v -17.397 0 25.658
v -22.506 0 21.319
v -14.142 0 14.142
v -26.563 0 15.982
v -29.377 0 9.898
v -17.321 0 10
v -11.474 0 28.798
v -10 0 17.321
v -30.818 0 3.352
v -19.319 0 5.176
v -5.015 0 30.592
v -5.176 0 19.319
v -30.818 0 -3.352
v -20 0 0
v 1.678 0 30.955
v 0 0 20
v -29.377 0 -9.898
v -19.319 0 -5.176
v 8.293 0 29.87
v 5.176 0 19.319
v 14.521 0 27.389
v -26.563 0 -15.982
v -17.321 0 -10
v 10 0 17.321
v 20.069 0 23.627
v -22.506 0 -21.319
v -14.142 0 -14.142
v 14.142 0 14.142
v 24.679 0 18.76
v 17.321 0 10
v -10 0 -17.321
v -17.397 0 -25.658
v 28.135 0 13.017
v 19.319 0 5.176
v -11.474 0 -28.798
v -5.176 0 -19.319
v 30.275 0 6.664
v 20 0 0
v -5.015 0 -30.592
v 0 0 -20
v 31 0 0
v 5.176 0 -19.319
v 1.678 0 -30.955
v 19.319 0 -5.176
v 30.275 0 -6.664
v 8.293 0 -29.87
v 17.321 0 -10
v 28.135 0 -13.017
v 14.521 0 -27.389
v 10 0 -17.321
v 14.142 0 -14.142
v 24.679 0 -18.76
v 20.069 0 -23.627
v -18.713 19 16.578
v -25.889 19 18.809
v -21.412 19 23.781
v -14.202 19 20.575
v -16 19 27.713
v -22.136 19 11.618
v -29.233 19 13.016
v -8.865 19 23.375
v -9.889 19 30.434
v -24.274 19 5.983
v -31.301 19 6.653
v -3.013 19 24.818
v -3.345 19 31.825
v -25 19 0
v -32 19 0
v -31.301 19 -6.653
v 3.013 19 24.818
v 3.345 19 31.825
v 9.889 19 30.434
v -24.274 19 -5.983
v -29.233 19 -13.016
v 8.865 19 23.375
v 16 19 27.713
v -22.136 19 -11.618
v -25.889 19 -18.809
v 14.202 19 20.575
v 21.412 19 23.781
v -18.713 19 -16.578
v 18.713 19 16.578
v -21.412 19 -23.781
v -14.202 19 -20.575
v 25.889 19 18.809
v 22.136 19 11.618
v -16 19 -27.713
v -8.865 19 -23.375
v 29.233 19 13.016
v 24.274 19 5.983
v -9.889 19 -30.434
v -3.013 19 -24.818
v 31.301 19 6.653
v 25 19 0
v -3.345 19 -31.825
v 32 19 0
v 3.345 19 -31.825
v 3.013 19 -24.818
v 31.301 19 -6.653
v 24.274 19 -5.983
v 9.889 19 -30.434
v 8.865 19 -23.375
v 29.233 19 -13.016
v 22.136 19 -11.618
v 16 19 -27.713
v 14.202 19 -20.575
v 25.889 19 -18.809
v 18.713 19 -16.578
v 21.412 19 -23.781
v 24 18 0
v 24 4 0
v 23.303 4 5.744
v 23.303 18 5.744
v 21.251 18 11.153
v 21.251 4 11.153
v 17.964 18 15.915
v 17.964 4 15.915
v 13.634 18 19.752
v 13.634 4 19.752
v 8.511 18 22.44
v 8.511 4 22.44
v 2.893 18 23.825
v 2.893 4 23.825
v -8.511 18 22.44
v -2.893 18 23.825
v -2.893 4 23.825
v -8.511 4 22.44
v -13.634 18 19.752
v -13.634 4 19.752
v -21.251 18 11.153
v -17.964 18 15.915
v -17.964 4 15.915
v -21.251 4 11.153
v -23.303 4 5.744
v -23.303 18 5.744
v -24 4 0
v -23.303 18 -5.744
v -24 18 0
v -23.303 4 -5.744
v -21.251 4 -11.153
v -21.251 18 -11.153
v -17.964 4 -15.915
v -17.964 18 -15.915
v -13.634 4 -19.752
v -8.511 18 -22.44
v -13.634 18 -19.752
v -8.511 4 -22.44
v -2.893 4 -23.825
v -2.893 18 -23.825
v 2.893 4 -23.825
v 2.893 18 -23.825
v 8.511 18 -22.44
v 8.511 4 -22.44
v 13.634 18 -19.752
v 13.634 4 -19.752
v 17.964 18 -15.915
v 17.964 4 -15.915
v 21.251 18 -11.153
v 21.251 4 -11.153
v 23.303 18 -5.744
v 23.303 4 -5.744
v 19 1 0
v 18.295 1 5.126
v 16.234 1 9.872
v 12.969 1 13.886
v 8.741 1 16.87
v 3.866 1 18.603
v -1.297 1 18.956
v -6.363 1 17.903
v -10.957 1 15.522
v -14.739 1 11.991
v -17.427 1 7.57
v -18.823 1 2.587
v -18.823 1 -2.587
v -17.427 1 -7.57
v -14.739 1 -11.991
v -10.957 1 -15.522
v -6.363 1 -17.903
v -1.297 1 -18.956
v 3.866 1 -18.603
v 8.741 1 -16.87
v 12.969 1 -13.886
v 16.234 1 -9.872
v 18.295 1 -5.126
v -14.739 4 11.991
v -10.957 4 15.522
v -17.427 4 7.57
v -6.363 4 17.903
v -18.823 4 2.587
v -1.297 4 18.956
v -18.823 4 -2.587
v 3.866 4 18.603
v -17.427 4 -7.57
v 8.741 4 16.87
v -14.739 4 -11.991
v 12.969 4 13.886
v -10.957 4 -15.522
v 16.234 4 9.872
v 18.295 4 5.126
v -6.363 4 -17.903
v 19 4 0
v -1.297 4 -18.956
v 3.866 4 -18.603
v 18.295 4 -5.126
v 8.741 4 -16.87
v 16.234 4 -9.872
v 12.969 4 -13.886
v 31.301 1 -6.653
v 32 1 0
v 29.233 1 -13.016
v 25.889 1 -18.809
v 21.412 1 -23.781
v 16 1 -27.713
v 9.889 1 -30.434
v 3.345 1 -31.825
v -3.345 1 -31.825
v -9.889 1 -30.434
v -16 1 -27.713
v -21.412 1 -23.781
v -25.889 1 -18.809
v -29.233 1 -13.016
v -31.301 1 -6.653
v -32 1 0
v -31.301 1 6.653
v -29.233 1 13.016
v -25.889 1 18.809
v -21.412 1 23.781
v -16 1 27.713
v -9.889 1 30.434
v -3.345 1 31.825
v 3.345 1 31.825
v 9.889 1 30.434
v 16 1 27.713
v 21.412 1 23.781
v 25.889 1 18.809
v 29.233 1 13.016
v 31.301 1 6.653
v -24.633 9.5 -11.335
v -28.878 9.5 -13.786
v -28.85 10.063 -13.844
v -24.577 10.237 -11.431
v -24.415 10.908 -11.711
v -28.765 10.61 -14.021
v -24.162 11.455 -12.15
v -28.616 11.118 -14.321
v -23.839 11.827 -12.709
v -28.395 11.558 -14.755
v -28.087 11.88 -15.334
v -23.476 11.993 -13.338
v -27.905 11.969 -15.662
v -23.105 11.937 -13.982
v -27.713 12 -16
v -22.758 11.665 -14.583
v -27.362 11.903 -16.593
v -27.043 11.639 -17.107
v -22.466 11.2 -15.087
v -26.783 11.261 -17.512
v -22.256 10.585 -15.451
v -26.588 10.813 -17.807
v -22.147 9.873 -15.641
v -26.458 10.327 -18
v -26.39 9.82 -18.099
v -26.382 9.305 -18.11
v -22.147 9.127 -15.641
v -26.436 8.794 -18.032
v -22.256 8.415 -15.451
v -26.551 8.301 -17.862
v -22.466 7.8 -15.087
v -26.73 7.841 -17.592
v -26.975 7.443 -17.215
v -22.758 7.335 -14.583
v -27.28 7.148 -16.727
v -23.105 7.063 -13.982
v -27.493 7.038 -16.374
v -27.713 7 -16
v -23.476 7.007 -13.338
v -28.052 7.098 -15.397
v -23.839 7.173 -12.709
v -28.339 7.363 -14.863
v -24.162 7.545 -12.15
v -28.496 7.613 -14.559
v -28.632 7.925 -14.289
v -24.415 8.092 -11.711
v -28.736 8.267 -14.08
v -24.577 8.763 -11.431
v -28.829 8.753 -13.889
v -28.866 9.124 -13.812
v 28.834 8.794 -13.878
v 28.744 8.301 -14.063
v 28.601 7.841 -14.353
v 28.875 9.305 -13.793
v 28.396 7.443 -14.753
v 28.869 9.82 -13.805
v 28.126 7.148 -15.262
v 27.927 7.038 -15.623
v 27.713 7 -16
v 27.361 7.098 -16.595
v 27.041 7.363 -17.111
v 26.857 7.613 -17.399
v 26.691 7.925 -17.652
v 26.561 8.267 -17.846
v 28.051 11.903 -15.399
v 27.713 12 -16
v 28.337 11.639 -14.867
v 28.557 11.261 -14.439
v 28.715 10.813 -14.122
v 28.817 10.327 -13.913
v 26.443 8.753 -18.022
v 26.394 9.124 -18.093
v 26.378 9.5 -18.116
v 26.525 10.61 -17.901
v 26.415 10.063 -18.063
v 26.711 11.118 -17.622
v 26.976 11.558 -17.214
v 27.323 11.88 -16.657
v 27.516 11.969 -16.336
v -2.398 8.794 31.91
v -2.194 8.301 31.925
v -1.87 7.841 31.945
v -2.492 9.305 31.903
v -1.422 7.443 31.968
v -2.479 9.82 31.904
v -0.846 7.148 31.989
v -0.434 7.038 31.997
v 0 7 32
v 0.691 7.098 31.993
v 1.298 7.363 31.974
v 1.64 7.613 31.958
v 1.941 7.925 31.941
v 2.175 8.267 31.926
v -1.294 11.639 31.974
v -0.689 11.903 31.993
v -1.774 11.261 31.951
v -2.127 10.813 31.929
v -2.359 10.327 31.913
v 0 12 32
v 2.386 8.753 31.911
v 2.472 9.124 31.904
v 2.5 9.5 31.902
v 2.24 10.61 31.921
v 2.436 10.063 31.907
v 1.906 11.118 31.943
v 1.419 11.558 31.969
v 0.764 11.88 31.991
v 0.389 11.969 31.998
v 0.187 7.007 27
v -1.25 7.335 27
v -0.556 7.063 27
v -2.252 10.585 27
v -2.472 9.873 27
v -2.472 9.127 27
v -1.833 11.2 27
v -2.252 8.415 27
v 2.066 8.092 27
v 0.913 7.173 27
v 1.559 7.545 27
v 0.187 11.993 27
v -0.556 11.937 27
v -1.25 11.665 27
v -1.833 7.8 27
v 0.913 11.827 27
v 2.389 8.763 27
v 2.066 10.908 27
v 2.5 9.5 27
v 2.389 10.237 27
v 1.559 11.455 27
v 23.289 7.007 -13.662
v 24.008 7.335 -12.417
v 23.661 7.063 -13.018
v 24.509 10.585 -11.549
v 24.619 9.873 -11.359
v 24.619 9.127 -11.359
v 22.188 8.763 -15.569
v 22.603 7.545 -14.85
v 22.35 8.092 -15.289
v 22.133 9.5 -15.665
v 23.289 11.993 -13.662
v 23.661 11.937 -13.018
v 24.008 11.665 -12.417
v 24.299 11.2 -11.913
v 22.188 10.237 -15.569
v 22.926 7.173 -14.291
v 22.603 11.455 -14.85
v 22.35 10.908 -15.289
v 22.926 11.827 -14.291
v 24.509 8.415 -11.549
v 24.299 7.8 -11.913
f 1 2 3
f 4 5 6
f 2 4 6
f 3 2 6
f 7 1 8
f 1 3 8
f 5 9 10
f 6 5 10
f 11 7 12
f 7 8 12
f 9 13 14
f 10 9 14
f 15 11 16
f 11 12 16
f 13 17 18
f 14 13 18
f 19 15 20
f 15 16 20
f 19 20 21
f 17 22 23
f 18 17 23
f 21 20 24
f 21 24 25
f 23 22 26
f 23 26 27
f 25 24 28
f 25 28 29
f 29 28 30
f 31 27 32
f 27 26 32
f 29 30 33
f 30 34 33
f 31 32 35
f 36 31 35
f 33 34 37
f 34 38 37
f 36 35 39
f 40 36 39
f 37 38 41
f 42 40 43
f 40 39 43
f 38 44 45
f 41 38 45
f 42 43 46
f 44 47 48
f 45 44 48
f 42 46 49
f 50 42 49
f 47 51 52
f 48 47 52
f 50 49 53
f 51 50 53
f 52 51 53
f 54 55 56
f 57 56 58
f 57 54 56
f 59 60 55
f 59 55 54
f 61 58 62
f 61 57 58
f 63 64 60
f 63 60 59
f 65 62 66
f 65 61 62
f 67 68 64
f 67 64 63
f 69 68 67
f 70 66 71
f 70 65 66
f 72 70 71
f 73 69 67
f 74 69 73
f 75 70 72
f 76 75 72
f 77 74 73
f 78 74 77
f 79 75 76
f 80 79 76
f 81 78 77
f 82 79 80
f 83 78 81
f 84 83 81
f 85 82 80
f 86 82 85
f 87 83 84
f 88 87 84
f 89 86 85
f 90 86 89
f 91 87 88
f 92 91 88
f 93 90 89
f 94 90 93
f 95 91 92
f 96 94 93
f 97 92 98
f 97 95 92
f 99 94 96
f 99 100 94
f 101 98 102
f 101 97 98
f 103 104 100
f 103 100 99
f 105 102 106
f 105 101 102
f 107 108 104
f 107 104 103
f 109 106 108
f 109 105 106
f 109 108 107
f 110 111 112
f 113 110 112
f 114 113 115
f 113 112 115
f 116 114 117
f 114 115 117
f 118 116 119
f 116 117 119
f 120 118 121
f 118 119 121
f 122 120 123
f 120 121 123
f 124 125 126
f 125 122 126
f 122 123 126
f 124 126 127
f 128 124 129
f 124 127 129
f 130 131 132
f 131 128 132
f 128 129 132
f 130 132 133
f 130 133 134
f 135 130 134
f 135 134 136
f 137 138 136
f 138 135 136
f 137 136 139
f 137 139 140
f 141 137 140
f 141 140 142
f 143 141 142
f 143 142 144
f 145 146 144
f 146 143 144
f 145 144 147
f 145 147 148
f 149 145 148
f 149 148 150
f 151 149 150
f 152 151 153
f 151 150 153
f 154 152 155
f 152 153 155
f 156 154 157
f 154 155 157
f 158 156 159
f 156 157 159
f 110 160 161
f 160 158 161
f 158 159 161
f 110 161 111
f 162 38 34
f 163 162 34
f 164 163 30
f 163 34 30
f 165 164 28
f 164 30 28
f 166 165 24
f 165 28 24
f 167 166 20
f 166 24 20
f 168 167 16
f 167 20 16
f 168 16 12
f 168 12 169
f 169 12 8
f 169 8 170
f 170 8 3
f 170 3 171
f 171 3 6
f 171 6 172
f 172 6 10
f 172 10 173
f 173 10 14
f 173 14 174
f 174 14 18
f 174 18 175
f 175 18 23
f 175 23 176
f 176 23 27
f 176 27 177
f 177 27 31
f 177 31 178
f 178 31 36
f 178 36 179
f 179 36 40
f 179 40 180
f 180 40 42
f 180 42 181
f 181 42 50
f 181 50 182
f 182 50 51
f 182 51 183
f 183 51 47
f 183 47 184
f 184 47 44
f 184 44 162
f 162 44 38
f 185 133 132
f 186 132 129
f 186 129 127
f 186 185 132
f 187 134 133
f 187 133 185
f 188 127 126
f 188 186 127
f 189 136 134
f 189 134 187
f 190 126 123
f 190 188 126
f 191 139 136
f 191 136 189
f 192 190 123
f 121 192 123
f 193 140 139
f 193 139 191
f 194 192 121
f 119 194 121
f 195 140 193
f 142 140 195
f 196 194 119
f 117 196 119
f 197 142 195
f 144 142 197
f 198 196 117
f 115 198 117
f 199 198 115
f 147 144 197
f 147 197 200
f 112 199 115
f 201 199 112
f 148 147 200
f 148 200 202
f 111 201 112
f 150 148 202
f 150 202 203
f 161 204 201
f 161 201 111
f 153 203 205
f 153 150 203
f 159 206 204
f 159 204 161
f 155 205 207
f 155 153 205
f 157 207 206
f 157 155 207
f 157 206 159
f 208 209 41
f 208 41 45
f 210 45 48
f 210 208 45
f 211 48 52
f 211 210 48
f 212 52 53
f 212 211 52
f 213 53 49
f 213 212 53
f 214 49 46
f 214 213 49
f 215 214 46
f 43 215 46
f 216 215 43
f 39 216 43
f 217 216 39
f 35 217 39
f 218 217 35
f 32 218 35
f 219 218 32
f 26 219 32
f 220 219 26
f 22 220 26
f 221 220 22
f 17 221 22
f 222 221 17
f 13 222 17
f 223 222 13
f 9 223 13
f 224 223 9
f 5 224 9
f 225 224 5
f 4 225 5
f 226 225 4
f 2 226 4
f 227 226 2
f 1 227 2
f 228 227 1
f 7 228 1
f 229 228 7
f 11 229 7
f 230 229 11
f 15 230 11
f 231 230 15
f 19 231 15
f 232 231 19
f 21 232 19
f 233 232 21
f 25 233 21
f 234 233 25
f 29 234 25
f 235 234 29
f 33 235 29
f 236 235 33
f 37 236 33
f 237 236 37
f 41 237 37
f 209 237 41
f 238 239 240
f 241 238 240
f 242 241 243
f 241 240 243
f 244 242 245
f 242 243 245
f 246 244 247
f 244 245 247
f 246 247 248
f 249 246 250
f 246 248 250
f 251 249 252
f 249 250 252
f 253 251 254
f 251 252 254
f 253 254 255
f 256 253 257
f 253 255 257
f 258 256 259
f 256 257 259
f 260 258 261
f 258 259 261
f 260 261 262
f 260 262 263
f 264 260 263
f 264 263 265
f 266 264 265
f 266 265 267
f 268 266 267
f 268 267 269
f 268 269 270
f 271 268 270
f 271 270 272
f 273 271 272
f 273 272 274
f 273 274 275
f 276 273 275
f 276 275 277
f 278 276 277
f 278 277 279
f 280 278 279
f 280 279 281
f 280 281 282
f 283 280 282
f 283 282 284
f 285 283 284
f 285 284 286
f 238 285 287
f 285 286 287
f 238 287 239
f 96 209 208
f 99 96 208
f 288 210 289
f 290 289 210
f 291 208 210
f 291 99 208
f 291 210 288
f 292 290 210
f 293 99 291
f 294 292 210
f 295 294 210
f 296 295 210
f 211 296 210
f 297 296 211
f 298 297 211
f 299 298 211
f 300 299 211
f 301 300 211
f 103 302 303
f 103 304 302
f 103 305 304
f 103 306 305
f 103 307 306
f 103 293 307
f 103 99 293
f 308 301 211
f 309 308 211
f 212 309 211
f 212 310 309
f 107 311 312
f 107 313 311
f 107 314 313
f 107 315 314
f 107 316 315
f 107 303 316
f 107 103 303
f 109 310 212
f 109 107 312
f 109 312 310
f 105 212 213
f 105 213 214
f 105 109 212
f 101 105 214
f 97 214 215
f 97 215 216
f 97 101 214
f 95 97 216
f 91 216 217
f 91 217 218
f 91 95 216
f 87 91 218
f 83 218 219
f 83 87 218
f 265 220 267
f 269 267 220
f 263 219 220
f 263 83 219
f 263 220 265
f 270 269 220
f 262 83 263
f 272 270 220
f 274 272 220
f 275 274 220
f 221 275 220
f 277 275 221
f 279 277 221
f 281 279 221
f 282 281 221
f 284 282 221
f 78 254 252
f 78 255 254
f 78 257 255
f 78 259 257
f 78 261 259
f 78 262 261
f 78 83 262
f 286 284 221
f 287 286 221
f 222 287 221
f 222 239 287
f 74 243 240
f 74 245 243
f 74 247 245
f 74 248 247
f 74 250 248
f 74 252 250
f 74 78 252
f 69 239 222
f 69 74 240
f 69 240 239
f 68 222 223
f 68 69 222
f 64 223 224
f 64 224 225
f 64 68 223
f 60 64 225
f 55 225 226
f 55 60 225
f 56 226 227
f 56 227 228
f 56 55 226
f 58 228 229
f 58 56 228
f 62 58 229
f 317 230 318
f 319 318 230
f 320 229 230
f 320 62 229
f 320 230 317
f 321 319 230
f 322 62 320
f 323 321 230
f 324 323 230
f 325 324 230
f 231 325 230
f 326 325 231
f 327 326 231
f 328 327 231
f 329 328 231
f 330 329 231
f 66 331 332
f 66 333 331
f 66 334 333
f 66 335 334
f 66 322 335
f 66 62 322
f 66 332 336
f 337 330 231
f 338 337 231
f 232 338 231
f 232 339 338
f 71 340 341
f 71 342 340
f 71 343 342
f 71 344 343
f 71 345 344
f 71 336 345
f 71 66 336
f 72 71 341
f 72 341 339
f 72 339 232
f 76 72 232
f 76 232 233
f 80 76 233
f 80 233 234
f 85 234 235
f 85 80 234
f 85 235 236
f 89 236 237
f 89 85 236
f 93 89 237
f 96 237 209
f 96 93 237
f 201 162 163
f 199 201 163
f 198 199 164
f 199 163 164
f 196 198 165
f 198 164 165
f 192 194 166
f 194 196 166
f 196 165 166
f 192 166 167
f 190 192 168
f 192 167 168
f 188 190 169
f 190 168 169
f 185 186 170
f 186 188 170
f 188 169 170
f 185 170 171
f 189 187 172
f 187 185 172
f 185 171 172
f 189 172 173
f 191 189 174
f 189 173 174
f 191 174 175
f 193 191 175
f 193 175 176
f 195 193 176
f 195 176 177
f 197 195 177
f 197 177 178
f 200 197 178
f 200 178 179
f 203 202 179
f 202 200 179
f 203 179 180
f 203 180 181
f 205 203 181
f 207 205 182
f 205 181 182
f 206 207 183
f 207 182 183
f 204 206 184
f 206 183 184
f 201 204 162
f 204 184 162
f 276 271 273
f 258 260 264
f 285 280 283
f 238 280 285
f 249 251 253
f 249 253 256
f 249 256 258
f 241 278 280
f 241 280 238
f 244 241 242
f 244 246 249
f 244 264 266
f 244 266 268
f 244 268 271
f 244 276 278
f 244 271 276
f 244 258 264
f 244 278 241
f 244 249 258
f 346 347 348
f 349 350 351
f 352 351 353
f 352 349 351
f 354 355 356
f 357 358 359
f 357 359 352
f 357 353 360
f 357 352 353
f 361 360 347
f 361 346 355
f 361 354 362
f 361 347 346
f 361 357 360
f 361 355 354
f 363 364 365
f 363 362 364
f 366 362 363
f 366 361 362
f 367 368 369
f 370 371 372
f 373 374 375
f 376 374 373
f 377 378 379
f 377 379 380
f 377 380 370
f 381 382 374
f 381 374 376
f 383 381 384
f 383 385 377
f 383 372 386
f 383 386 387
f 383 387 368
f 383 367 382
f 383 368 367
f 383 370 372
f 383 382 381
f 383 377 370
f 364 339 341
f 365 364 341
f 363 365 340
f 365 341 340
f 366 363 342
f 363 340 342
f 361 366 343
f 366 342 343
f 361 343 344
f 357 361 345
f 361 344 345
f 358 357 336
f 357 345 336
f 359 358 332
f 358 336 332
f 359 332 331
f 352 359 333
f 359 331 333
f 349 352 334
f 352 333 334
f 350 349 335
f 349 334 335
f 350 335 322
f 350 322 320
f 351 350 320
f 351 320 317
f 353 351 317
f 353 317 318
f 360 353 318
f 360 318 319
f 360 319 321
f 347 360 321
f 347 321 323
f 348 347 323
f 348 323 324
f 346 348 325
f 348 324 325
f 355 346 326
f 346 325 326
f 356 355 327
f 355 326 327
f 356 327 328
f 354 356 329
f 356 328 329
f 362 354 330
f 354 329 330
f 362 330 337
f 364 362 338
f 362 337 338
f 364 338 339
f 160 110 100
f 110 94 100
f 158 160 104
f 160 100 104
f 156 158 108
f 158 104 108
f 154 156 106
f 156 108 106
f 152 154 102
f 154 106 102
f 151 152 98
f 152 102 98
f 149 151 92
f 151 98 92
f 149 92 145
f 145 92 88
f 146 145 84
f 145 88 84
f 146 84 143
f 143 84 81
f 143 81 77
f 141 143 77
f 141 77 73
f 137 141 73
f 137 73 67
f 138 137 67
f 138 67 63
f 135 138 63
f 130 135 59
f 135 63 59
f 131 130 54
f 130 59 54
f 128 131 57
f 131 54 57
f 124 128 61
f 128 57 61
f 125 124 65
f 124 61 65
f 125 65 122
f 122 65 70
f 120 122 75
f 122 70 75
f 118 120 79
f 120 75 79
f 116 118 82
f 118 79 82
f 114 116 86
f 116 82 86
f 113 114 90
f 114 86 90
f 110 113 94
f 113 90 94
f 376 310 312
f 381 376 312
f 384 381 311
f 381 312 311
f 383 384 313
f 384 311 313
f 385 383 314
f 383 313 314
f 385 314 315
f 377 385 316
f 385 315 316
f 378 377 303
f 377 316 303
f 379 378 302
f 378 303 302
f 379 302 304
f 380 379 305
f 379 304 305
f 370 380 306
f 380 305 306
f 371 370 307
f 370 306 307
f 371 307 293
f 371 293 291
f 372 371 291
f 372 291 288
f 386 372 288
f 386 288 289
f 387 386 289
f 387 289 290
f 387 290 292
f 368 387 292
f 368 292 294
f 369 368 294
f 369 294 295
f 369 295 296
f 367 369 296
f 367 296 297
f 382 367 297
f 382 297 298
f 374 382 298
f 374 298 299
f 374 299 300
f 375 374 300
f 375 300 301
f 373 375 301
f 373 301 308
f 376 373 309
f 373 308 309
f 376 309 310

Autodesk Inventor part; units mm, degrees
ref_plane "YZ Plane" through (0, 0, 0) normal (1, 0, 0) x (0, 1, 0)
ref_plane "XZ Plane" through (0, 0, 0) normal (0, 1, 0) x (-1, 0, 0)
sketch "Sketch1" plane through (0, 0, 0) normal (0, 0, 1) x (1, 0, 0)
  line L0 (19, 0) -> (32, 0)
  line L1 (32, 0) -> (32, 19)
  line L2 (32, 19) -> (24, 19)
  line L3 (24, 19) -> (24, 4)
  line L4 (24, 4) -> (19, 4)
  line L5 (19, 4) -> (19, 0)
  line L6 (0, 0) -> (0, 12.2084)
  dimension "d0" = 48
  dimension "d1" = 15
  dimension "d2" = 4
  dimension "d4" = 8
  dimension "d17" = 38
revolve "Revolution1" add sketch "Sketch1" angle 360 about axis through (0, 0, 0) along (0, 1, 0)
chamfer "Chamfer1" distance 1 angle 45 1 edges at (-32, 0, 0)
chamfer "Chamfer2" distance 1 angle 45 1 edges at (-19, 0, 0)
chamfer "Chamfer3" distance 1 angle 45 1 edges at (-24, 19, 0)
thread "Thread1" size "M48x2" class "6H" standard "ANSI Metric M Profile" full length
ref_plane "Work Plane1" through (0, 9.5, 32) normal (0, 0, 1) x (1, 0, 0)
sketch "Sketch3" plane through (0, 9.5, 32) normal (0, 0, 1) x (1, 0, 0)
  circle A0 centre (0, 0) radius 2.5
  point P0 (0, -9.5)
  dimension "d18" = 5
extrude "Extrusion1" cut sketch "Sketch3" against normal blind 5
thread "Thread2" size "M5x0.8" class "6H" standard "ANSI Metric M Profile" full length
pattern_circular "Circular Pattern1" count 3 over 360 about axis through (0, 9.5, 0) along (0, 1, 0) of "Extrusion1"
properties part number "Oring_M48-2_nut" material "Stainless Steel, 440C"
